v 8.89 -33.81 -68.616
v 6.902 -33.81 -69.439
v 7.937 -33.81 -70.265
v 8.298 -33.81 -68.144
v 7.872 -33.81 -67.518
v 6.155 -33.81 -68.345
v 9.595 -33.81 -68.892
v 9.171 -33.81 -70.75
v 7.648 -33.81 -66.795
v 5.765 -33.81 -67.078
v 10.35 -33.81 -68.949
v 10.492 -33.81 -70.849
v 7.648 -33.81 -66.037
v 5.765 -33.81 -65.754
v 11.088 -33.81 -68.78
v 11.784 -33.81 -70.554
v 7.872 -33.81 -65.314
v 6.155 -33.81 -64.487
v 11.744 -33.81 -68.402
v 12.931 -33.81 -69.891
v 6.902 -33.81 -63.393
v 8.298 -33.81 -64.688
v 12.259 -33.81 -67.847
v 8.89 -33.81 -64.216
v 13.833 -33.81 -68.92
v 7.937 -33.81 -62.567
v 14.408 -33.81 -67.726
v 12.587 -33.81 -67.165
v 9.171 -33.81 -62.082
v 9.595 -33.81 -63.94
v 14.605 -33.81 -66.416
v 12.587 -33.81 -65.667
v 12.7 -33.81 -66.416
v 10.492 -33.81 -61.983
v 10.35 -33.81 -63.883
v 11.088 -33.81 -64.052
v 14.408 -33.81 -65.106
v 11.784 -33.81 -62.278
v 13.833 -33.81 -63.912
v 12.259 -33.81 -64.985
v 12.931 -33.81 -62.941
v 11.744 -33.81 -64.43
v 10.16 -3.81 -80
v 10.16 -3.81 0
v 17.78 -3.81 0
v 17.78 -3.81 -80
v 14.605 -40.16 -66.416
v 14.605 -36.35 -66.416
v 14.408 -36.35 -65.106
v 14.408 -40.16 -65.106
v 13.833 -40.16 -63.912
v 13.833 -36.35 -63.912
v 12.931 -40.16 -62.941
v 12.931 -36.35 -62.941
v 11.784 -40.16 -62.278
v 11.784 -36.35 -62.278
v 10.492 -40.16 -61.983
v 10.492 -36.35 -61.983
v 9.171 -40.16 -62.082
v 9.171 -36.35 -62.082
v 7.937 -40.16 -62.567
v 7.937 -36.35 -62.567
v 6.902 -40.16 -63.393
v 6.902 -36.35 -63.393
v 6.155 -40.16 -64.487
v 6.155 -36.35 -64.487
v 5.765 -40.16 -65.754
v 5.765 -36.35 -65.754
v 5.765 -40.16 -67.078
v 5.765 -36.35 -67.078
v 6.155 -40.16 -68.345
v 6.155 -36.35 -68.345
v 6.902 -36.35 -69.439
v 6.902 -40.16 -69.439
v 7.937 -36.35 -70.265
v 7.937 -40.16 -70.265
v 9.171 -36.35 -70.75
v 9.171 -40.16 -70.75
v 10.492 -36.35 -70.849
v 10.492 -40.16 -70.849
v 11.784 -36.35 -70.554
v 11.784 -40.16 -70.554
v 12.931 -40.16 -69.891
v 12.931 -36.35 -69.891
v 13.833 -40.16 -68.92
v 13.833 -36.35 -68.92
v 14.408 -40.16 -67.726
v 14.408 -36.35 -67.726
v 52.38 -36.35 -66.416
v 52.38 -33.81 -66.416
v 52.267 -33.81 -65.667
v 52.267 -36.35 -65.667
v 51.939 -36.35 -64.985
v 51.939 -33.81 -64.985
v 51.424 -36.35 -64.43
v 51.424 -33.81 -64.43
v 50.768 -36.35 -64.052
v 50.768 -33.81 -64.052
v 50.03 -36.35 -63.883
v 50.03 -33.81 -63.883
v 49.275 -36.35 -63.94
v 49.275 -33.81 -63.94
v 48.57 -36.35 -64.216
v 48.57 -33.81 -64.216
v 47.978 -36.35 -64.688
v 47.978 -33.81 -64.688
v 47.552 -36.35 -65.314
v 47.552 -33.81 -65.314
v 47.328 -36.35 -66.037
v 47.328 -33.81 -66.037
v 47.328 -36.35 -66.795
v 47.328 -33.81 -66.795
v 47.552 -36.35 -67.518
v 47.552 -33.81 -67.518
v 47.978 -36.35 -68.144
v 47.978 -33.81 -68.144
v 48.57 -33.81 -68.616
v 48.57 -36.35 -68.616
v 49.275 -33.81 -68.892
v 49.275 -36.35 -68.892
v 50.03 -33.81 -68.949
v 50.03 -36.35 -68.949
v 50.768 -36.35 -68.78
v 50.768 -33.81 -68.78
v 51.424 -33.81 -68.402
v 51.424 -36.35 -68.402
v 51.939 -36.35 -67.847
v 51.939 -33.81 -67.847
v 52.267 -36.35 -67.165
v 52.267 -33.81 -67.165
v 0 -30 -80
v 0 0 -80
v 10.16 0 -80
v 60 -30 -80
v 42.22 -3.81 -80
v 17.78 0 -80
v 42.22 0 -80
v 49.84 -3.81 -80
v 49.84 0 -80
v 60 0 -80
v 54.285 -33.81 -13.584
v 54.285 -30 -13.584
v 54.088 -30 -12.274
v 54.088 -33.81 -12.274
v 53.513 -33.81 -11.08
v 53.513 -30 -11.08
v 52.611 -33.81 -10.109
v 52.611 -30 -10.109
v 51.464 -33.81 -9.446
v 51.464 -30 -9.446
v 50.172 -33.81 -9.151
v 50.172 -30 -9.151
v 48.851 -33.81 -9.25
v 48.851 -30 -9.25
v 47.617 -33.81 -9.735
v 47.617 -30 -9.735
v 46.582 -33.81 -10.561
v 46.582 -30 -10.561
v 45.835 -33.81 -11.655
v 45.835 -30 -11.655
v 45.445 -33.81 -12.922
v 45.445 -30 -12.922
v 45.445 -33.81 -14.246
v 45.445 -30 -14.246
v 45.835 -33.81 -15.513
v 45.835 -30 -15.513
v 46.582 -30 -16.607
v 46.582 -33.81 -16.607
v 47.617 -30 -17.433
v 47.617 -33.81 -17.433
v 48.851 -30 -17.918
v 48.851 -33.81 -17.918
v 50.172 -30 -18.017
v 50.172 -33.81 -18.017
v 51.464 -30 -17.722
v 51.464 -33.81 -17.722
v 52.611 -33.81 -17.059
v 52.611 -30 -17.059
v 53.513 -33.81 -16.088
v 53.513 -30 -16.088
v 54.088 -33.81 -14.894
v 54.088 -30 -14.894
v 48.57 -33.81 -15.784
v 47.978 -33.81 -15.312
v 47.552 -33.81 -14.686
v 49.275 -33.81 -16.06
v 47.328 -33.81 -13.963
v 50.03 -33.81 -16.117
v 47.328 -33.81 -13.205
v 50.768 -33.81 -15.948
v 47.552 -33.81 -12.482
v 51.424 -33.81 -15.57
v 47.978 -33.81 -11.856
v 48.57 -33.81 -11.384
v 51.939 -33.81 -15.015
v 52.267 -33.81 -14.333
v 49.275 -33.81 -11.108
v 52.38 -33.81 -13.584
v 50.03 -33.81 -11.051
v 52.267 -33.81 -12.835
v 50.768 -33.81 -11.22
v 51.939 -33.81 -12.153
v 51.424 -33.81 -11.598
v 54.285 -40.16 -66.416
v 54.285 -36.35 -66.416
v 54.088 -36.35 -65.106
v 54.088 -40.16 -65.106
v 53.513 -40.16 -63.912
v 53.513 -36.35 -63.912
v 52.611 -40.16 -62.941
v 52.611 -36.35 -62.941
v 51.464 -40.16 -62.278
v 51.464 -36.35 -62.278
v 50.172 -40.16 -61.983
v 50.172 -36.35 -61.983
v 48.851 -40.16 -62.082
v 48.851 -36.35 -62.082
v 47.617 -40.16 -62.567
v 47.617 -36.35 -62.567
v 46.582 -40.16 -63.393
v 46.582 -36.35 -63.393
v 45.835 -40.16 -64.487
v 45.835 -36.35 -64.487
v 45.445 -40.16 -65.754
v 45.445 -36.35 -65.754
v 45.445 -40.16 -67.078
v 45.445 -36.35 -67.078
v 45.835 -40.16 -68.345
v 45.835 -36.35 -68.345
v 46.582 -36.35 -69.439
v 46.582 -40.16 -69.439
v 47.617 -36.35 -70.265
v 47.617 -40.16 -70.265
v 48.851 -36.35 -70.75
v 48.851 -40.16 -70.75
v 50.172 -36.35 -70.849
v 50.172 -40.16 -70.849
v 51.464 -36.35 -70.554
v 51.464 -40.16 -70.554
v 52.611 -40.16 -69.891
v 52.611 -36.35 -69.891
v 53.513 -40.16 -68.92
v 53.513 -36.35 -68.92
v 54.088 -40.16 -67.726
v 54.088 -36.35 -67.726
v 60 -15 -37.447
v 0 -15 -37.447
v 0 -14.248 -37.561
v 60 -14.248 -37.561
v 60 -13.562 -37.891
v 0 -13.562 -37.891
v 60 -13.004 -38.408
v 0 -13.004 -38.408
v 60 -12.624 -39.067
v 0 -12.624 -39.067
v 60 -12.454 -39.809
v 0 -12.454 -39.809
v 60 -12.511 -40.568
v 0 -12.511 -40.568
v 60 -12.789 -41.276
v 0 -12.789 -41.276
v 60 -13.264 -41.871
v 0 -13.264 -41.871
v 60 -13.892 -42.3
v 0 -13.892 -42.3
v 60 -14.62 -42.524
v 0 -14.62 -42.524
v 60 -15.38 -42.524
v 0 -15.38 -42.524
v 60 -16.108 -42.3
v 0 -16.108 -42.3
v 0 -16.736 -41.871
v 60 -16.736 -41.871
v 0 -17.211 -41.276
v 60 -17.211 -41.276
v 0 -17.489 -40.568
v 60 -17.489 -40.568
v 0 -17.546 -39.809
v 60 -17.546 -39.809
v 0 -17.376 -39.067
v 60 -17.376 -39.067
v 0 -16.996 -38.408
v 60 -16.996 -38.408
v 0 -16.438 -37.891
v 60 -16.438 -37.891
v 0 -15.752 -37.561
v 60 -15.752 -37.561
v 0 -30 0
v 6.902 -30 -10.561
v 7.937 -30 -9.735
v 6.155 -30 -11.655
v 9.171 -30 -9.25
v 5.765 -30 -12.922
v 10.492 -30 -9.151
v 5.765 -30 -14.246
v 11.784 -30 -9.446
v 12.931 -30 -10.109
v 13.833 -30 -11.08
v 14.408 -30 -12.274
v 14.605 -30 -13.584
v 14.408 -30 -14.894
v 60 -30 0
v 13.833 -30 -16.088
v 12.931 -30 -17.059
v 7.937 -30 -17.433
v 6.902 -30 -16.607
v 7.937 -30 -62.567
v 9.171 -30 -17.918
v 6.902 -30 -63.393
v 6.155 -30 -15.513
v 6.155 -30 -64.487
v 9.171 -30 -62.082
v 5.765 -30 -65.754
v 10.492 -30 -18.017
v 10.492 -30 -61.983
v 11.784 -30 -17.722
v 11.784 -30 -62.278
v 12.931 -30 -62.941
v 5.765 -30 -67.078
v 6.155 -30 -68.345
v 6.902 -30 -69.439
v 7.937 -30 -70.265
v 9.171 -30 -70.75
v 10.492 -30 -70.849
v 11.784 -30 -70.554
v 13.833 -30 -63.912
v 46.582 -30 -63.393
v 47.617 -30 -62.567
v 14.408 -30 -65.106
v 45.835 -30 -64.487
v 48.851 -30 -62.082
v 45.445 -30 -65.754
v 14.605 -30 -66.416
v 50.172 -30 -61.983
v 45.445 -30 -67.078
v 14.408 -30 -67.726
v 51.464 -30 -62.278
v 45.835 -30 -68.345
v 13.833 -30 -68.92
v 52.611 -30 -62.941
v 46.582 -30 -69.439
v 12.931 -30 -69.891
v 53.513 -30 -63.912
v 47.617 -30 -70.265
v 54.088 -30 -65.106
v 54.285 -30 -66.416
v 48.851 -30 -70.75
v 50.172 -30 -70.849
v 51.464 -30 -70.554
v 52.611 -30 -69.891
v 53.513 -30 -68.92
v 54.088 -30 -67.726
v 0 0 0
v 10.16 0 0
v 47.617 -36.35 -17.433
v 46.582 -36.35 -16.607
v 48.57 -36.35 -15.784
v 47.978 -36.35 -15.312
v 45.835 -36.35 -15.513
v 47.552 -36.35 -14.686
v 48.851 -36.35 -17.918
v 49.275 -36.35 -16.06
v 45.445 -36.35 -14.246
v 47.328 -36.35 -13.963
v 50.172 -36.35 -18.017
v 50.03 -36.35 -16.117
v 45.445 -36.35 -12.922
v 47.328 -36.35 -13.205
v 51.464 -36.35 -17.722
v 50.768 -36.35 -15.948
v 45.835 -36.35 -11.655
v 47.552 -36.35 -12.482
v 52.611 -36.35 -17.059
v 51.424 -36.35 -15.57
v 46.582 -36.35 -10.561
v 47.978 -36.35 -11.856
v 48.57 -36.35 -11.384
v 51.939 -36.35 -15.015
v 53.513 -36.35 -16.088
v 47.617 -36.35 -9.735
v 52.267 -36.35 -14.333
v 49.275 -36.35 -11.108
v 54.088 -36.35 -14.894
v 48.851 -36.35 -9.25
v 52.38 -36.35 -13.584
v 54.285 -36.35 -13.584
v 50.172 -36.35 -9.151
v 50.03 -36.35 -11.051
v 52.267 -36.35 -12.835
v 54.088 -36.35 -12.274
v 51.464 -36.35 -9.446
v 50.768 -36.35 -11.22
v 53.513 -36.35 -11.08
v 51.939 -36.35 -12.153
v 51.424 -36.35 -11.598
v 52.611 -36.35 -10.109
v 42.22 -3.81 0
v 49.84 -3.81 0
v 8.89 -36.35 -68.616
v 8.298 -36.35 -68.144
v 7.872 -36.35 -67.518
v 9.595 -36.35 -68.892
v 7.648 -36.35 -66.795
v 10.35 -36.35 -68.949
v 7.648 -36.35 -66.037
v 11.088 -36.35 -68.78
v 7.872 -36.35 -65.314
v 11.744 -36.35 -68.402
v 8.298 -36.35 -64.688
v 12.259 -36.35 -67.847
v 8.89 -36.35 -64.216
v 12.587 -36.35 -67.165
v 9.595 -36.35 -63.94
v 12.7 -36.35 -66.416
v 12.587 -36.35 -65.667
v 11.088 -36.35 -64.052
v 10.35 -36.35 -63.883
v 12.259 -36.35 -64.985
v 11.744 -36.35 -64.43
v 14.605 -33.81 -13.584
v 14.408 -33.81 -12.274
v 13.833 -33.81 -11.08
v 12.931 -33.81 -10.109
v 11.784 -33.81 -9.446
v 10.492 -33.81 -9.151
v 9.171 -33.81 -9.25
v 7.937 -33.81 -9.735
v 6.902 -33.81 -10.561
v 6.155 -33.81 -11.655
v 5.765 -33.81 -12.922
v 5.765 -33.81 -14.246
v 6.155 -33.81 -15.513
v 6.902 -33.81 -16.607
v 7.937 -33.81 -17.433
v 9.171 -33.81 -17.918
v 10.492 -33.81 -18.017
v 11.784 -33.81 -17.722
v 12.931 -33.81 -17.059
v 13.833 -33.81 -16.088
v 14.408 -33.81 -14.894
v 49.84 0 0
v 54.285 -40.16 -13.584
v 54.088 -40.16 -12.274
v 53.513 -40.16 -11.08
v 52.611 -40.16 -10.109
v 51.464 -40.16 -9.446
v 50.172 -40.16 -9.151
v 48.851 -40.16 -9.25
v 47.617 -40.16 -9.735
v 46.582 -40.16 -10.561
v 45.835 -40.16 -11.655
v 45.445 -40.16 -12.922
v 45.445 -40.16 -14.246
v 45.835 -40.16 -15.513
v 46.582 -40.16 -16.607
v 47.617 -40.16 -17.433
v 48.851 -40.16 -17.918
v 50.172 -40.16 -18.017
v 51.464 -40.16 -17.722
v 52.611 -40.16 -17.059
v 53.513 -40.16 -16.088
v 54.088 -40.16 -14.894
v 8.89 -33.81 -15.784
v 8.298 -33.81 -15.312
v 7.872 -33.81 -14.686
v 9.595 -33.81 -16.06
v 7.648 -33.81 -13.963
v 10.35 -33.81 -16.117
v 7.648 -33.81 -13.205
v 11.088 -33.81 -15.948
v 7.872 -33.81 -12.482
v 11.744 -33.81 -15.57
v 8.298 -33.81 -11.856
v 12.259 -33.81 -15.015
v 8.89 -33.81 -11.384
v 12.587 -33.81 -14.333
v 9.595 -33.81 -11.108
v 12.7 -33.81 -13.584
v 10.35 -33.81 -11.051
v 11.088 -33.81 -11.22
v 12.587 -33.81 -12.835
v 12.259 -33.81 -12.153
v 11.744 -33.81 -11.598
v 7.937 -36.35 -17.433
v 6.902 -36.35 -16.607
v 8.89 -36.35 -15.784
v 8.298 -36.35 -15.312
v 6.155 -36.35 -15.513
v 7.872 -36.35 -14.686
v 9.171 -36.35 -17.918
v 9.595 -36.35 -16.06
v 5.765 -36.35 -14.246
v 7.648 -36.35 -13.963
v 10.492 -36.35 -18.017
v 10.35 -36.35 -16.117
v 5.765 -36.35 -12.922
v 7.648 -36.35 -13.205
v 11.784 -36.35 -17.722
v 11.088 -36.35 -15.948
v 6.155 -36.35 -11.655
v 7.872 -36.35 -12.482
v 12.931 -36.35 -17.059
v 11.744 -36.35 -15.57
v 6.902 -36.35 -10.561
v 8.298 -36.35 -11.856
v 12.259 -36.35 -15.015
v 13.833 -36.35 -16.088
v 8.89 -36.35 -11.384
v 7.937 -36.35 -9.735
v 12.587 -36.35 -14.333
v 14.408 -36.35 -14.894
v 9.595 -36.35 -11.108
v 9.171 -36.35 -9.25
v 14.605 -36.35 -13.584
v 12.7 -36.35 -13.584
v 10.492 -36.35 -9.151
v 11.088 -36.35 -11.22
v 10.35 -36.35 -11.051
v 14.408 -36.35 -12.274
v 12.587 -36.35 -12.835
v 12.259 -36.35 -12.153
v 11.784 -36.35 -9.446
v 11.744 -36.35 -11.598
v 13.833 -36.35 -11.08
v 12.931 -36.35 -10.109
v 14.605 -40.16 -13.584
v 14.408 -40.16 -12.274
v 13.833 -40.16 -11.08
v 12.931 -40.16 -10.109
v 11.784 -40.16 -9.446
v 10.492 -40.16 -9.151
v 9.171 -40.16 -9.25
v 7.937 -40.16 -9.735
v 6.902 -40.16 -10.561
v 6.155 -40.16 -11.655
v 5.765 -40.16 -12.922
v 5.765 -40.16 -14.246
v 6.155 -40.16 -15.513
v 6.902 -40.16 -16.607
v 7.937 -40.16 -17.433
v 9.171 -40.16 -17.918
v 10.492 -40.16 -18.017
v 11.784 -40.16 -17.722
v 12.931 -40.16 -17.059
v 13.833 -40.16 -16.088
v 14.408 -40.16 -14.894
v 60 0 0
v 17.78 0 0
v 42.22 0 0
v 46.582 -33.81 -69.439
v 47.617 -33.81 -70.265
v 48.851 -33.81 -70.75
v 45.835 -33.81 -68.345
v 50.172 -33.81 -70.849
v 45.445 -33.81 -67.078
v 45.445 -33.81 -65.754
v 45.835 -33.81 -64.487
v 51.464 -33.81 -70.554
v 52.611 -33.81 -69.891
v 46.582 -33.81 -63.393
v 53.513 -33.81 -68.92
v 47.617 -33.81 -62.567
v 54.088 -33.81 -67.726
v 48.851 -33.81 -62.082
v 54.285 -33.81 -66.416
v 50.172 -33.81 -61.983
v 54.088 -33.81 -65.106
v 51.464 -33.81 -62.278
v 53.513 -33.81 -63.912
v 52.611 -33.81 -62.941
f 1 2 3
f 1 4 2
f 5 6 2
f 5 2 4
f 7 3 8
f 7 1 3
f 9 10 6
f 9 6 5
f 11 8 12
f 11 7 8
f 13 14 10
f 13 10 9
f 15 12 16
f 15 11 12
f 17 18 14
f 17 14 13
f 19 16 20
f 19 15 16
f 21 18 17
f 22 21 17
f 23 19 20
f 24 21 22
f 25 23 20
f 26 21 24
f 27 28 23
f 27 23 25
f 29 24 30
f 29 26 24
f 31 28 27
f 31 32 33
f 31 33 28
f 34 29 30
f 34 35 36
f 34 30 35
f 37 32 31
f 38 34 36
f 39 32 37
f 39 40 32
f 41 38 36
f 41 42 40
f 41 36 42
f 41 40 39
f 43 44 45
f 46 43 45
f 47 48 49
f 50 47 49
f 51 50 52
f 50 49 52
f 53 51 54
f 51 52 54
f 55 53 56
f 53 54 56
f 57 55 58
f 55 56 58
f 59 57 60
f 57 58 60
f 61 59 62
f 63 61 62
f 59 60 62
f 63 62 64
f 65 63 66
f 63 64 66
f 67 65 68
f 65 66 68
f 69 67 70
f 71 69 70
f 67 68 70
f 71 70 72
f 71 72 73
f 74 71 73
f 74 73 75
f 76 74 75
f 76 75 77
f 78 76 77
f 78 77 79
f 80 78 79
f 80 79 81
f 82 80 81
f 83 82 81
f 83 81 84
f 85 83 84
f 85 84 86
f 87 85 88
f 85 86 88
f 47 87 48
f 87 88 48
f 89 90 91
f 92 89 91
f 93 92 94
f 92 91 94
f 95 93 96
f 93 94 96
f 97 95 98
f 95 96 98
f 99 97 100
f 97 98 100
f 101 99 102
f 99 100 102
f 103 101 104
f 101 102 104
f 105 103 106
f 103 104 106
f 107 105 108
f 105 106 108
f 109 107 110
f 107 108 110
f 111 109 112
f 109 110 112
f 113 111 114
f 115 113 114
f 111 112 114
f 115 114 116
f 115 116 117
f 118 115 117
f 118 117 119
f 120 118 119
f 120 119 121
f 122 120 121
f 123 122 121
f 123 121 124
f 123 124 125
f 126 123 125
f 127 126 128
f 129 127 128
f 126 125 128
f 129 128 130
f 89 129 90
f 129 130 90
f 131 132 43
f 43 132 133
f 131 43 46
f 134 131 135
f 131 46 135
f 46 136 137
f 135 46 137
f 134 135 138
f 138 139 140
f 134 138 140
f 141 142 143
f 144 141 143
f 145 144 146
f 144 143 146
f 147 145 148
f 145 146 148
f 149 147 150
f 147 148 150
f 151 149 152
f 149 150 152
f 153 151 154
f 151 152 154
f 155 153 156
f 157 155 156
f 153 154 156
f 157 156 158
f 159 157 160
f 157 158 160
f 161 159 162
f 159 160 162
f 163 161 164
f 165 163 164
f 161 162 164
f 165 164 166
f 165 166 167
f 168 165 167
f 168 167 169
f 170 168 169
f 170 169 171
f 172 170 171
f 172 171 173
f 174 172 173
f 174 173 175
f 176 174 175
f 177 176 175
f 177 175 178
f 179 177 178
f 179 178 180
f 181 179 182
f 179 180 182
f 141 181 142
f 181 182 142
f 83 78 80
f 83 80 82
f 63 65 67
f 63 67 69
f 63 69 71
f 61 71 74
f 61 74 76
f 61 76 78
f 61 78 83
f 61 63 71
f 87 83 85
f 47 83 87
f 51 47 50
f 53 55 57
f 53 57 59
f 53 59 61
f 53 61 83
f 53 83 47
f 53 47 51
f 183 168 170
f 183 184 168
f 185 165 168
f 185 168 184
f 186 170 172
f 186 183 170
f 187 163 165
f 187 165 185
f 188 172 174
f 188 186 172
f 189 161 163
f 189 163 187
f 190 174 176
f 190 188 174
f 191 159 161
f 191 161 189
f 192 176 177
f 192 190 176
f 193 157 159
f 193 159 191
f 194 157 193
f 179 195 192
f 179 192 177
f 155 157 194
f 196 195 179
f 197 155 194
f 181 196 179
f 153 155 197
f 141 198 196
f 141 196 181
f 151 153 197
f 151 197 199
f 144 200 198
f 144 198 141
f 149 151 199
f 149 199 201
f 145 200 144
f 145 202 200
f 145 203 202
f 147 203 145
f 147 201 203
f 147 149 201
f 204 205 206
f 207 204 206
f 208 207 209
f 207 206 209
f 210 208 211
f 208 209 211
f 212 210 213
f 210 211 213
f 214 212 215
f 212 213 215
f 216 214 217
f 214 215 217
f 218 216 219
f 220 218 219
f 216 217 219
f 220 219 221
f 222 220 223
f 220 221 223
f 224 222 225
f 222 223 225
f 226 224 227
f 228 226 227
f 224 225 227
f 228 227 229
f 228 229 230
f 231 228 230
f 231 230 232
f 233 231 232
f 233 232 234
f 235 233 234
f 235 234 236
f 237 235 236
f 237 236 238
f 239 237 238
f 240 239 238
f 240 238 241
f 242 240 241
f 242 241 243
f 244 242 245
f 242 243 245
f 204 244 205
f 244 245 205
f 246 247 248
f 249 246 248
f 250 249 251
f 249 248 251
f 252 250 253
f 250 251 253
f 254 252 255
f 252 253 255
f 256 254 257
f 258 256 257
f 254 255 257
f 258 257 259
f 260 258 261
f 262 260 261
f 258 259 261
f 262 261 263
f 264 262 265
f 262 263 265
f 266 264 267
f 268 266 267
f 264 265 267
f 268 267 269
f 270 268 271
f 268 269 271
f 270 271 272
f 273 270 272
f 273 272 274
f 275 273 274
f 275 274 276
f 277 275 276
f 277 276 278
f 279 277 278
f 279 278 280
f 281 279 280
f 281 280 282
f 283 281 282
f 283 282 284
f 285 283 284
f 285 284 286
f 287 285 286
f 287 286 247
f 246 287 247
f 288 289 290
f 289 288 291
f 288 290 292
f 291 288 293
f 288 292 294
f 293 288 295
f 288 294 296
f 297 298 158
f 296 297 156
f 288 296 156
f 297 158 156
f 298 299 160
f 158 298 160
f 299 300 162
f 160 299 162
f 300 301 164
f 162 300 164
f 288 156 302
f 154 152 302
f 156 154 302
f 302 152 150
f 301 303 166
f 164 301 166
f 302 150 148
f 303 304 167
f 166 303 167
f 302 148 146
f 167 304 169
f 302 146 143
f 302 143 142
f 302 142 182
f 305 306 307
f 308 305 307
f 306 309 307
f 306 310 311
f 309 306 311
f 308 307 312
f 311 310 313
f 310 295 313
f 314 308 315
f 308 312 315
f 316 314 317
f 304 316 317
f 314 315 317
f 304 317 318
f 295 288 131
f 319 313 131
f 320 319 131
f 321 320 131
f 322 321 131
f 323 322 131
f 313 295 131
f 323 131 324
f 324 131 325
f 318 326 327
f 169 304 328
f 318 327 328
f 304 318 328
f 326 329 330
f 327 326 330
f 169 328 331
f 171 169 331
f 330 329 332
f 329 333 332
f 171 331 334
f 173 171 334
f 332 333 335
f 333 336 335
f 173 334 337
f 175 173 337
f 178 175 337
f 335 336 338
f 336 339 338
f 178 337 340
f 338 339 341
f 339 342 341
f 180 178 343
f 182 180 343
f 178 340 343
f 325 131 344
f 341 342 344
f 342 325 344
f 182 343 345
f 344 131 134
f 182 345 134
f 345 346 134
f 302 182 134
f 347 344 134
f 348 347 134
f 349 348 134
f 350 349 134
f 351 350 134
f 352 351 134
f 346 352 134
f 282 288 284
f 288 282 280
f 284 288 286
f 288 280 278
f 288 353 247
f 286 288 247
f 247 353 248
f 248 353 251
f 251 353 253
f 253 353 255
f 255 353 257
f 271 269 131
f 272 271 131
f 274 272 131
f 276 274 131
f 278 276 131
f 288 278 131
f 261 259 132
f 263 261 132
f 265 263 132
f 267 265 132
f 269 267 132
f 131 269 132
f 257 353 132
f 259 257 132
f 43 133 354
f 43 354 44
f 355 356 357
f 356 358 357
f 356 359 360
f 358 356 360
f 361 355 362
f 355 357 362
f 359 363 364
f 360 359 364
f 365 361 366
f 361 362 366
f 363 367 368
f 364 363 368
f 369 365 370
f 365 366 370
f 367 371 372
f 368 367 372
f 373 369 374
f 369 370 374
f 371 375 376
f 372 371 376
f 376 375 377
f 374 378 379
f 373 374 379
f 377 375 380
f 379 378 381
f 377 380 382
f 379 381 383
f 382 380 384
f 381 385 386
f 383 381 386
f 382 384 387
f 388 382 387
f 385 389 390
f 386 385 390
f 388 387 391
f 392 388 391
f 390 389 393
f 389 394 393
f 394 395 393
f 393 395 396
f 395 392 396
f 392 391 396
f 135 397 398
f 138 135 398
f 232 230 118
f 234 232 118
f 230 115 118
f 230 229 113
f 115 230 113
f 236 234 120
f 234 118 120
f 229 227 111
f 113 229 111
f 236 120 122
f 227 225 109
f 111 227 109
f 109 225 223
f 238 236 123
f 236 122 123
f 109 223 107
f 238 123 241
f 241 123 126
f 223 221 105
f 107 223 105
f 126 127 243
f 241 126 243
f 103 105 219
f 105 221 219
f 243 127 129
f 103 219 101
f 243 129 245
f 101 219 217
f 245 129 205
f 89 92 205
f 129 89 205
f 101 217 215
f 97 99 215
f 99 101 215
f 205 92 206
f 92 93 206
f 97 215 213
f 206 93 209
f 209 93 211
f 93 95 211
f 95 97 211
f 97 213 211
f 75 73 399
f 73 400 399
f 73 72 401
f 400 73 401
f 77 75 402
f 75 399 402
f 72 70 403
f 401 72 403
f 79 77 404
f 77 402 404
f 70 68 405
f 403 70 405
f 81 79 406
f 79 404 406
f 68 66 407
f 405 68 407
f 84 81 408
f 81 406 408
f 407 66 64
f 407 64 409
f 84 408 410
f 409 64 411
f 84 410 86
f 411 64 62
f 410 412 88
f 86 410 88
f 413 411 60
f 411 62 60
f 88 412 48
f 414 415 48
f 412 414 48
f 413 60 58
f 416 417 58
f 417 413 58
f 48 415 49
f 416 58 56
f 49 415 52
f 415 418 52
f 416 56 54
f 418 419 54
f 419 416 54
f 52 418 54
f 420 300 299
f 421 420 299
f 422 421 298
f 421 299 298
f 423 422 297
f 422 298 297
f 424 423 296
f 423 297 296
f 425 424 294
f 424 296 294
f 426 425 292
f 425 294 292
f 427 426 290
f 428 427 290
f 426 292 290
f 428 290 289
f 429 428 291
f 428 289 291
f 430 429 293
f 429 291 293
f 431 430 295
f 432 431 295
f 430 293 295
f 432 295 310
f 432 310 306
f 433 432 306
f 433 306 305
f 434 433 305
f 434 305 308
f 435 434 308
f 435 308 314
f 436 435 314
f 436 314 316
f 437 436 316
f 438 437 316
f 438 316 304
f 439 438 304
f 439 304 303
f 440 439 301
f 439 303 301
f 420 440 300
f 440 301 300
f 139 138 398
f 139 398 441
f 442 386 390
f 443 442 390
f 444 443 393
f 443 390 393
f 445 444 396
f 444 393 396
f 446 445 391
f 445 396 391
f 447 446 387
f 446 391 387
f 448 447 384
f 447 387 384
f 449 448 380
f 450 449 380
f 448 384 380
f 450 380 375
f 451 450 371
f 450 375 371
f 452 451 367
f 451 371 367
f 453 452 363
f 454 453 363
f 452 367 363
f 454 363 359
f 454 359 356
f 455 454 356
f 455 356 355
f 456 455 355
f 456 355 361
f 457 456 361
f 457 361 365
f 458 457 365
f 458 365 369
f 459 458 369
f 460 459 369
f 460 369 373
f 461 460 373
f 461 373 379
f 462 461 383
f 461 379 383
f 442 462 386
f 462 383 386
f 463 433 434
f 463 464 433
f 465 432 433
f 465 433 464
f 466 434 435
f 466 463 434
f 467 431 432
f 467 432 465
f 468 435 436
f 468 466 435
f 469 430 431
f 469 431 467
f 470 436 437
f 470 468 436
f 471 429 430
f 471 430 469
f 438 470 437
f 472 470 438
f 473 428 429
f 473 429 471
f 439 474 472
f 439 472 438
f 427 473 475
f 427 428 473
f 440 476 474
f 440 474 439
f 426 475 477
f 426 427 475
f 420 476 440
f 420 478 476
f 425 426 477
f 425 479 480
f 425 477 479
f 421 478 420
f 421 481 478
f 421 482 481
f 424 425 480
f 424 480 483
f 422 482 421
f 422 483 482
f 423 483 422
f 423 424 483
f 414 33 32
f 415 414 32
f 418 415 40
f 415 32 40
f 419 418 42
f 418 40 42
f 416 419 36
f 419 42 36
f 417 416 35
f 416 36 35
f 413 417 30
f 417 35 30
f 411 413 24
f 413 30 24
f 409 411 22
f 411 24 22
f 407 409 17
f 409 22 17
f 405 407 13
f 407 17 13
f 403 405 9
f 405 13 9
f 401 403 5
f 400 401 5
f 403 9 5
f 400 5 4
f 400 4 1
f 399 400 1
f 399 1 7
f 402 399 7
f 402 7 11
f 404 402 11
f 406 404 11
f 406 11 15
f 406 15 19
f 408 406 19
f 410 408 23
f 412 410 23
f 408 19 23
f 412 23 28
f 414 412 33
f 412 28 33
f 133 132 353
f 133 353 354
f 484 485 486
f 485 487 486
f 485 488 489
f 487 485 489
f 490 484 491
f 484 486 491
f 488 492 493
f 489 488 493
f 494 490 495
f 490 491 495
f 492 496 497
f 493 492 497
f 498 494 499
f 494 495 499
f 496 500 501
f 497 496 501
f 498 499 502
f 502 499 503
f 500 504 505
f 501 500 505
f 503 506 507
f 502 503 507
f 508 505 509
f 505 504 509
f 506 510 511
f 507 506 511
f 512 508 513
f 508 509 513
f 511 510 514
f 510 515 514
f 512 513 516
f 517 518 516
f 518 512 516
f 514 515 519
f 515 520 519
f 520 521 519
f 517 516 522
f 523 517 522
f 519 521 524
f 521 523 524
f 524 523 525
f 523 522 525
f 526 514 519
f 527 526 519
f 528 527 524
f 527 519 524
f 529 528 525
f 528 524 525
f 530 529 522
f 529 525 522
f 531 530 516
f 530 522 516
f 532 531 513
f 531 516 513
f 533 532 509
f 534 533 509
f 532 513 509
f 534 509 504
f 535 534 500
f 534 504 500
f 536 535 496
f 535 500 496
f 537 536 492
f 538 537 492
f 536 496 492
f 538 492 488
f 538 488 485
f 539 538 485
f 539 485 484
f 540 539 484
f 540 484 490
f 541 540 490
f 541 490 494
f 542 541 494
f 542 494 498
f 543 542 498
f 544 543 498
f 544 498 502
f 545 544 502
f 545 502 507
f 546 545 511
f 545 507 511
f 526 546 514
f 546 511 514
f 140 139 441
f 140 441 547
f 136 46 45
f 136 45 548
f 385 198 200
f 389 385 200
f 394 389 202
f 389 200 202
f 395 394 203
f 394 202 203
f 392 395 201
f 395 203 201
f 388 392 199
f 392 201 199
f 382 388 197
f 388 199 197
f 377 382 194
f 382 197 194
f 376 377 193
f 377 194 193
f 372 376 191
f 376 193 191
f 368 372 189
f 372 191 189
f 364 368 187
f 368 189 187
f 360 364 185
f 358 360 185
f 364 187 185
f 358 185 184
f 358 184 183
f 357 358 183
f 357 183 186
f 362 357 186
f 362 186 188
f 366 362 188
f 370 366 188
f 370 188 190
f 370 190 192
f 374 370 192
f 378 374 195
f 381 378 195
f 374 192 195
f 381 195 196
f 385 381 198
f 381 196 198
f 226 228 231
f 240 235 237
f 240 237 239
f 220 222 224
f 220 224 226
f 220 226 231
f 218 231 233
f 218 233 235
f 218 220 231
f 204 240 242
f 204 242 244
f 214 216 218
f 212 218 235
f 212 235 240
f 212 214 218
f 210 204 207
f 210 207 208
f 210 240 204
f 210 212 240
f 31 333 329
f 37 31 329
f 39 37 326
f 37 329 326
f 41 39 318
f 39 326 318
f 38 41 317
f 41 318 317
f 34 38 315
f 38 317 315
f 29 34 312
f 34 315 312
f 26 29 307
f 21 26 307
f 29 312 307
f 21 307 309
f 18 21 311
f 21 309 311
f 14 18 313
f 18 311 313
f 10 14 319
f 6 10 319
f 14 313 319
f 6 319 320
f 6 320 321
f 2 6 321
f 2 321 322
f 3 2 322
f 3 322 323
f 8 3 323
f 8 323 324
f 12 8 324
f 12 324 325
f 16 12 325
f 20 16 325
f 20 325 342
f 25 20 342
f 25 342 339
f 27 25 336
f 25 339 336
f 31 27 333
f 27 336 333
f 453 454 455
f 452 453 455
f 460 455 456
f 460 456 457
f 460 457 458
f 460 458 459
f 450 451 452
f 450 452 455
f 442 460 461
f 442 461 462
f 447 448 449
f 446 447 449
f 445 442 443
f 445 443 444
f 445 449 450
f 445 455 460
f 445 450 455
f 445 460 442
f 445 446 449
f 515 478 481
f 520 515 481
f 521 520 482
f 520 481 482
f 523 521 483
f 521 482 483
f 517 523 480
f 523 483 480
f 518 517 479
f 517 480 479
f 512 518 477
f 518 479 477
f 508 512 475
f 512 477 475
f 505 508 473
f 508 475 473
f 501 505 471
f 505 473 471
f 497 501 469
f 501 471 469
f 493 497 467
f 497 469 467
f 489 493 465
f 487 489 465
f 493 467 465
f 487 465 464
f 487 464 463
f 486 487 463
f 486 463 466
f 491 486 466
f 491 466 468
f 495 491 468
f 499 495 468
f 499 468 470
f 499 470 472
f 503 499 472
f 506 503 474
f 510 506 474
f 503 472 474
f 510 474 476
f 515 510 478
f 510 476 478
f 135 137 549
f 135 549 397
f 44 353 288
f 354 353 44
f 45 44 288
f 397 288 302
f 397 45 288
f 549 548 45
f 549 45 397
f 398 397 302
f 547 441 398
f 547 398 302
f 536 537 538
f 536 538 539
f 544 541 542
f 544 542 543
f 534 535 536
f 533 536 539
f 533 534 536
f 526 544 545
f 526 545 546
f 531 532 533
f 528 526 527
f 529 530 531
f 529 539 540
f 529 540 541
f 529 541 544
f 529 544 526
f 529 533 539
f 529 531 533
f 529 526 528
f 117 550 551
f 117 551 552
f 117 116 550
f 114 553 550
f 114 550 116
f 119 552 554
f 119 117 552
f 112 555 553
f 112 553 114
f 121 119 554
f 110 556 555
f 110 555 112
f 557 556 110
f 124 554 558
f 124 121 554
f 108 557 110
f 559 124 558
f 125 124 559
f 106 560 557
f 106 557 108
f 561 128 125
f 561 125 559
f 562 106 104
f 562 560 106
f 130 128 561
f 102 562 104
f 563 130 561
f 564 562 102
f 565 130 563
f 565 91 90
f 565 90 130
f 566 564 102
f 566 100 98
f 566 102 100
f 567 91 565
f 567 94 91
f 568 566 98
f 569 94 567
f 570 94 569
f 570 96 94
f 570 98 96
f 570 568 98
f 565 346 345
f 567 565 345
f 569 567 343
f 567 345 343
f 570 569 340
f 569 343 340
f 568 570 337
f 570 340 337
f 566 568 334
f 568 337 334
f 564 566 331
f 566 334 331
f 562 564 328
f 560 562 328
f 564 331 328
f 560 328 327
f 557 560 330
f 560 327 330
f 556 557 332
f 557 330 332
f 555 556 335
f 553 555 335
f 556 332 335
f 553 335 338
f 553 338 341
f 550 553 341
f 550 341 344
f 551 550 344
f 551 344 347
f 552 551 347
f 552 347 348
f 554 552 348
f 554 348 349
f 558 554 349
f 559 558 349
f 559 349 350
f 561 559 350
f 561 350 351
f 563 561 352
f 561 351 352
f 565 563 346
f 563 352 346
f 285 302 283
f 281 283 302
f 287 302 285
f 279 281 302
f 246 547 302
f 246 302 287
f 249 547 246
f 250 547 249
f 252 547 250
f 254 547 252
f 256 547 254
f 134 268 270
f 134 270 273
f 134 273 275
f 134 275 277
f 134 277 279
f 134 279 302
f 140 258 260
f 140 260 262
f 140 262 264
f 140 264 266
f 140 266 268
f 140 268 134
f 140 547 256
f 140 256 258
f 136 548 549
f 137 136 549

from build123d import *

# Parameters (mm, degrees)
SKETCH1_W               = 59.999999888
SKETCH1_H               = 80
BOSS_EXTRUDE1_DEPTH     = 30
CUT_EXTRUDE1_DEPTH      = 81
SKETCH3_R               = 4.445
BOSS_EXTRUDE2_DEPTH     = 3.81
SKETCH4_R               = 2.54
BOSS_EXTRUDE3_DEPTH     = 2.54
SKETCH5_R               = 4.445
BOSS_EXTRUDE4_DEPTH     = 3.81
F_1_4_20_TAPPED_HOLE1_D = 5.1054


with BuildPart() as part:
    # Sketch1 → Boss-Extrude1 (new body)
    with BuildSketch(Plane(origin=(0, 0, 0), x_dir=(1, 0, 0), z_dir=(0, 1, 0))):
        with Locations((29.999999944, 40)):
            Rectangle(SKETCH1_W, SKETCH1_H)
    extrude(amount=-BOSS_EXTRUDE1_DEPTH)

    # Sketch2 → Cut-Extrude1 (cut, through all)
    with BuildSketch(Plane.XY):
        with BuildLine():
            ThreePointArc((13.97, -3.81), (11.275923164, -2.694076836), (10.16, 0))
            Line((10.16, 0), (10.16, -3.81))
            Line((10.16, -3.81), (13.97, -3.81))
        make_face()
        with BuildLine():
            Line((17.78, 0), (10.16, 0))
            ThreePointArc((10.16, 0), (11.275923164, -2.694076836), (13.97, -3.81))
            ThreePointArc((13.97, -3.81), (16.664076836, -2.694076836), (17.78, 0))
        make_face()
        with BuildLine():
            ThreePointArc((17.78, 0), (16.664076836, -2.694076836), (13.97, -3.81))
            Line((13.97, -3.81), (17.78, -3.81))
            Line((17.78, -3.81), (17.78, 0))
        make_face()
        with BuildLine():
            Line((49.839999888, 0), (42.219999888, 0))
            ThreePointArc((42.219999888, 0), (43.335923052, -2.694076836), (46.029999888, -3.81))
            ThreePointArc((46.029999888, -3.81), (48.724076724, -2.694076836), (49.839999888, 0))
        make_face()
        with BuildLine():
            ThreePointArc((46.029999888, -3.81), (43.335923052, -2.694076836), (42.219999888, 0))
            Line((42.219999888, 0), (42.219999888, -3.81))
            Line((42.219999888, -3.81), (46.029999888, -3.81))
        make_face()
        with BuildLine():
            ThreePointArc((49.839999888, 0), (48.724076724, -2.694076836), (46.029999888, -3.81))
            Line((46.029999888, -3.81), (49.839999888, -3.81))
            Line((49.839999888, -3.81), (49.839999888, 0))
        make_face()
    extrude(amount=-CUT_EXTRUDE1_DEPTH, mode=Mode.SUBTRACT)

    # Sketch3 → Boss-Extrude2 (add)
    with BuildSketch(Plane.XZ.offset(30)):
        with Locations((49.839999888, -13.584)):
            Circle(SKETCH3_R)
        with Locations((10.16, -13.584)):
            Circle(SKETCH3_R)
        with Locations((49.839999888, -66.416)):
            Circle(SKETCH3_R)
        with Locations((10.16, -66.416)):
            Circle(SKETCH3_R)
    extrude(amount=BOSS_EXTRUDE2_DEPTH)

    # Sketch4 → Boss-Extrude3 (add)
    with BuildSketch(Plane.XZ.offset(33.81)):
        with Locations((49.839999888, -13.584)):
            Circle(SKETCH4_R)
        with Locations((10.16, -13.584)):
            Circle(SKETCH4_R)
        with Locations((10.16, -66.416)):
            Circle(SKETCH4_R)
        with Locations((49.839999888, -66.416)):
            Circle(SKETCH4_R)
    extrude(amount=BOSS_EXTRUDE3_DEPTH)

    # Sketch5 → Boss-Extrude4 (add)
    with BuildSketch(Plane.XZ.offset(36.35)):
        with Locations((10.16, -13.584)):
            Circle(SKETCH5_R)
        with Locations((10.16, -66.416)):
            Circle(SKETCH5_R)
        with Locations((49.839999888, -66.416)):
            Circle(SKETCH5_R)
        with Locations((49.839999888, -13.584)):
            Circle(SKETCH5_R)
    extrude(amount=BOSS_EXTRUDE4_DEPTH)

    # 1/4-20 Tapped Hole1 (through all)
    with Locations(Plane(origin=(59.999999888, 0, 0), x_dir=(0, 0, -1), z_dir=(1, 0, 0))):
        with Locations((40, -15)):
            Hole(F_1_4_20_TAPPED_HOLE1_D / 2)


solid = part.part
